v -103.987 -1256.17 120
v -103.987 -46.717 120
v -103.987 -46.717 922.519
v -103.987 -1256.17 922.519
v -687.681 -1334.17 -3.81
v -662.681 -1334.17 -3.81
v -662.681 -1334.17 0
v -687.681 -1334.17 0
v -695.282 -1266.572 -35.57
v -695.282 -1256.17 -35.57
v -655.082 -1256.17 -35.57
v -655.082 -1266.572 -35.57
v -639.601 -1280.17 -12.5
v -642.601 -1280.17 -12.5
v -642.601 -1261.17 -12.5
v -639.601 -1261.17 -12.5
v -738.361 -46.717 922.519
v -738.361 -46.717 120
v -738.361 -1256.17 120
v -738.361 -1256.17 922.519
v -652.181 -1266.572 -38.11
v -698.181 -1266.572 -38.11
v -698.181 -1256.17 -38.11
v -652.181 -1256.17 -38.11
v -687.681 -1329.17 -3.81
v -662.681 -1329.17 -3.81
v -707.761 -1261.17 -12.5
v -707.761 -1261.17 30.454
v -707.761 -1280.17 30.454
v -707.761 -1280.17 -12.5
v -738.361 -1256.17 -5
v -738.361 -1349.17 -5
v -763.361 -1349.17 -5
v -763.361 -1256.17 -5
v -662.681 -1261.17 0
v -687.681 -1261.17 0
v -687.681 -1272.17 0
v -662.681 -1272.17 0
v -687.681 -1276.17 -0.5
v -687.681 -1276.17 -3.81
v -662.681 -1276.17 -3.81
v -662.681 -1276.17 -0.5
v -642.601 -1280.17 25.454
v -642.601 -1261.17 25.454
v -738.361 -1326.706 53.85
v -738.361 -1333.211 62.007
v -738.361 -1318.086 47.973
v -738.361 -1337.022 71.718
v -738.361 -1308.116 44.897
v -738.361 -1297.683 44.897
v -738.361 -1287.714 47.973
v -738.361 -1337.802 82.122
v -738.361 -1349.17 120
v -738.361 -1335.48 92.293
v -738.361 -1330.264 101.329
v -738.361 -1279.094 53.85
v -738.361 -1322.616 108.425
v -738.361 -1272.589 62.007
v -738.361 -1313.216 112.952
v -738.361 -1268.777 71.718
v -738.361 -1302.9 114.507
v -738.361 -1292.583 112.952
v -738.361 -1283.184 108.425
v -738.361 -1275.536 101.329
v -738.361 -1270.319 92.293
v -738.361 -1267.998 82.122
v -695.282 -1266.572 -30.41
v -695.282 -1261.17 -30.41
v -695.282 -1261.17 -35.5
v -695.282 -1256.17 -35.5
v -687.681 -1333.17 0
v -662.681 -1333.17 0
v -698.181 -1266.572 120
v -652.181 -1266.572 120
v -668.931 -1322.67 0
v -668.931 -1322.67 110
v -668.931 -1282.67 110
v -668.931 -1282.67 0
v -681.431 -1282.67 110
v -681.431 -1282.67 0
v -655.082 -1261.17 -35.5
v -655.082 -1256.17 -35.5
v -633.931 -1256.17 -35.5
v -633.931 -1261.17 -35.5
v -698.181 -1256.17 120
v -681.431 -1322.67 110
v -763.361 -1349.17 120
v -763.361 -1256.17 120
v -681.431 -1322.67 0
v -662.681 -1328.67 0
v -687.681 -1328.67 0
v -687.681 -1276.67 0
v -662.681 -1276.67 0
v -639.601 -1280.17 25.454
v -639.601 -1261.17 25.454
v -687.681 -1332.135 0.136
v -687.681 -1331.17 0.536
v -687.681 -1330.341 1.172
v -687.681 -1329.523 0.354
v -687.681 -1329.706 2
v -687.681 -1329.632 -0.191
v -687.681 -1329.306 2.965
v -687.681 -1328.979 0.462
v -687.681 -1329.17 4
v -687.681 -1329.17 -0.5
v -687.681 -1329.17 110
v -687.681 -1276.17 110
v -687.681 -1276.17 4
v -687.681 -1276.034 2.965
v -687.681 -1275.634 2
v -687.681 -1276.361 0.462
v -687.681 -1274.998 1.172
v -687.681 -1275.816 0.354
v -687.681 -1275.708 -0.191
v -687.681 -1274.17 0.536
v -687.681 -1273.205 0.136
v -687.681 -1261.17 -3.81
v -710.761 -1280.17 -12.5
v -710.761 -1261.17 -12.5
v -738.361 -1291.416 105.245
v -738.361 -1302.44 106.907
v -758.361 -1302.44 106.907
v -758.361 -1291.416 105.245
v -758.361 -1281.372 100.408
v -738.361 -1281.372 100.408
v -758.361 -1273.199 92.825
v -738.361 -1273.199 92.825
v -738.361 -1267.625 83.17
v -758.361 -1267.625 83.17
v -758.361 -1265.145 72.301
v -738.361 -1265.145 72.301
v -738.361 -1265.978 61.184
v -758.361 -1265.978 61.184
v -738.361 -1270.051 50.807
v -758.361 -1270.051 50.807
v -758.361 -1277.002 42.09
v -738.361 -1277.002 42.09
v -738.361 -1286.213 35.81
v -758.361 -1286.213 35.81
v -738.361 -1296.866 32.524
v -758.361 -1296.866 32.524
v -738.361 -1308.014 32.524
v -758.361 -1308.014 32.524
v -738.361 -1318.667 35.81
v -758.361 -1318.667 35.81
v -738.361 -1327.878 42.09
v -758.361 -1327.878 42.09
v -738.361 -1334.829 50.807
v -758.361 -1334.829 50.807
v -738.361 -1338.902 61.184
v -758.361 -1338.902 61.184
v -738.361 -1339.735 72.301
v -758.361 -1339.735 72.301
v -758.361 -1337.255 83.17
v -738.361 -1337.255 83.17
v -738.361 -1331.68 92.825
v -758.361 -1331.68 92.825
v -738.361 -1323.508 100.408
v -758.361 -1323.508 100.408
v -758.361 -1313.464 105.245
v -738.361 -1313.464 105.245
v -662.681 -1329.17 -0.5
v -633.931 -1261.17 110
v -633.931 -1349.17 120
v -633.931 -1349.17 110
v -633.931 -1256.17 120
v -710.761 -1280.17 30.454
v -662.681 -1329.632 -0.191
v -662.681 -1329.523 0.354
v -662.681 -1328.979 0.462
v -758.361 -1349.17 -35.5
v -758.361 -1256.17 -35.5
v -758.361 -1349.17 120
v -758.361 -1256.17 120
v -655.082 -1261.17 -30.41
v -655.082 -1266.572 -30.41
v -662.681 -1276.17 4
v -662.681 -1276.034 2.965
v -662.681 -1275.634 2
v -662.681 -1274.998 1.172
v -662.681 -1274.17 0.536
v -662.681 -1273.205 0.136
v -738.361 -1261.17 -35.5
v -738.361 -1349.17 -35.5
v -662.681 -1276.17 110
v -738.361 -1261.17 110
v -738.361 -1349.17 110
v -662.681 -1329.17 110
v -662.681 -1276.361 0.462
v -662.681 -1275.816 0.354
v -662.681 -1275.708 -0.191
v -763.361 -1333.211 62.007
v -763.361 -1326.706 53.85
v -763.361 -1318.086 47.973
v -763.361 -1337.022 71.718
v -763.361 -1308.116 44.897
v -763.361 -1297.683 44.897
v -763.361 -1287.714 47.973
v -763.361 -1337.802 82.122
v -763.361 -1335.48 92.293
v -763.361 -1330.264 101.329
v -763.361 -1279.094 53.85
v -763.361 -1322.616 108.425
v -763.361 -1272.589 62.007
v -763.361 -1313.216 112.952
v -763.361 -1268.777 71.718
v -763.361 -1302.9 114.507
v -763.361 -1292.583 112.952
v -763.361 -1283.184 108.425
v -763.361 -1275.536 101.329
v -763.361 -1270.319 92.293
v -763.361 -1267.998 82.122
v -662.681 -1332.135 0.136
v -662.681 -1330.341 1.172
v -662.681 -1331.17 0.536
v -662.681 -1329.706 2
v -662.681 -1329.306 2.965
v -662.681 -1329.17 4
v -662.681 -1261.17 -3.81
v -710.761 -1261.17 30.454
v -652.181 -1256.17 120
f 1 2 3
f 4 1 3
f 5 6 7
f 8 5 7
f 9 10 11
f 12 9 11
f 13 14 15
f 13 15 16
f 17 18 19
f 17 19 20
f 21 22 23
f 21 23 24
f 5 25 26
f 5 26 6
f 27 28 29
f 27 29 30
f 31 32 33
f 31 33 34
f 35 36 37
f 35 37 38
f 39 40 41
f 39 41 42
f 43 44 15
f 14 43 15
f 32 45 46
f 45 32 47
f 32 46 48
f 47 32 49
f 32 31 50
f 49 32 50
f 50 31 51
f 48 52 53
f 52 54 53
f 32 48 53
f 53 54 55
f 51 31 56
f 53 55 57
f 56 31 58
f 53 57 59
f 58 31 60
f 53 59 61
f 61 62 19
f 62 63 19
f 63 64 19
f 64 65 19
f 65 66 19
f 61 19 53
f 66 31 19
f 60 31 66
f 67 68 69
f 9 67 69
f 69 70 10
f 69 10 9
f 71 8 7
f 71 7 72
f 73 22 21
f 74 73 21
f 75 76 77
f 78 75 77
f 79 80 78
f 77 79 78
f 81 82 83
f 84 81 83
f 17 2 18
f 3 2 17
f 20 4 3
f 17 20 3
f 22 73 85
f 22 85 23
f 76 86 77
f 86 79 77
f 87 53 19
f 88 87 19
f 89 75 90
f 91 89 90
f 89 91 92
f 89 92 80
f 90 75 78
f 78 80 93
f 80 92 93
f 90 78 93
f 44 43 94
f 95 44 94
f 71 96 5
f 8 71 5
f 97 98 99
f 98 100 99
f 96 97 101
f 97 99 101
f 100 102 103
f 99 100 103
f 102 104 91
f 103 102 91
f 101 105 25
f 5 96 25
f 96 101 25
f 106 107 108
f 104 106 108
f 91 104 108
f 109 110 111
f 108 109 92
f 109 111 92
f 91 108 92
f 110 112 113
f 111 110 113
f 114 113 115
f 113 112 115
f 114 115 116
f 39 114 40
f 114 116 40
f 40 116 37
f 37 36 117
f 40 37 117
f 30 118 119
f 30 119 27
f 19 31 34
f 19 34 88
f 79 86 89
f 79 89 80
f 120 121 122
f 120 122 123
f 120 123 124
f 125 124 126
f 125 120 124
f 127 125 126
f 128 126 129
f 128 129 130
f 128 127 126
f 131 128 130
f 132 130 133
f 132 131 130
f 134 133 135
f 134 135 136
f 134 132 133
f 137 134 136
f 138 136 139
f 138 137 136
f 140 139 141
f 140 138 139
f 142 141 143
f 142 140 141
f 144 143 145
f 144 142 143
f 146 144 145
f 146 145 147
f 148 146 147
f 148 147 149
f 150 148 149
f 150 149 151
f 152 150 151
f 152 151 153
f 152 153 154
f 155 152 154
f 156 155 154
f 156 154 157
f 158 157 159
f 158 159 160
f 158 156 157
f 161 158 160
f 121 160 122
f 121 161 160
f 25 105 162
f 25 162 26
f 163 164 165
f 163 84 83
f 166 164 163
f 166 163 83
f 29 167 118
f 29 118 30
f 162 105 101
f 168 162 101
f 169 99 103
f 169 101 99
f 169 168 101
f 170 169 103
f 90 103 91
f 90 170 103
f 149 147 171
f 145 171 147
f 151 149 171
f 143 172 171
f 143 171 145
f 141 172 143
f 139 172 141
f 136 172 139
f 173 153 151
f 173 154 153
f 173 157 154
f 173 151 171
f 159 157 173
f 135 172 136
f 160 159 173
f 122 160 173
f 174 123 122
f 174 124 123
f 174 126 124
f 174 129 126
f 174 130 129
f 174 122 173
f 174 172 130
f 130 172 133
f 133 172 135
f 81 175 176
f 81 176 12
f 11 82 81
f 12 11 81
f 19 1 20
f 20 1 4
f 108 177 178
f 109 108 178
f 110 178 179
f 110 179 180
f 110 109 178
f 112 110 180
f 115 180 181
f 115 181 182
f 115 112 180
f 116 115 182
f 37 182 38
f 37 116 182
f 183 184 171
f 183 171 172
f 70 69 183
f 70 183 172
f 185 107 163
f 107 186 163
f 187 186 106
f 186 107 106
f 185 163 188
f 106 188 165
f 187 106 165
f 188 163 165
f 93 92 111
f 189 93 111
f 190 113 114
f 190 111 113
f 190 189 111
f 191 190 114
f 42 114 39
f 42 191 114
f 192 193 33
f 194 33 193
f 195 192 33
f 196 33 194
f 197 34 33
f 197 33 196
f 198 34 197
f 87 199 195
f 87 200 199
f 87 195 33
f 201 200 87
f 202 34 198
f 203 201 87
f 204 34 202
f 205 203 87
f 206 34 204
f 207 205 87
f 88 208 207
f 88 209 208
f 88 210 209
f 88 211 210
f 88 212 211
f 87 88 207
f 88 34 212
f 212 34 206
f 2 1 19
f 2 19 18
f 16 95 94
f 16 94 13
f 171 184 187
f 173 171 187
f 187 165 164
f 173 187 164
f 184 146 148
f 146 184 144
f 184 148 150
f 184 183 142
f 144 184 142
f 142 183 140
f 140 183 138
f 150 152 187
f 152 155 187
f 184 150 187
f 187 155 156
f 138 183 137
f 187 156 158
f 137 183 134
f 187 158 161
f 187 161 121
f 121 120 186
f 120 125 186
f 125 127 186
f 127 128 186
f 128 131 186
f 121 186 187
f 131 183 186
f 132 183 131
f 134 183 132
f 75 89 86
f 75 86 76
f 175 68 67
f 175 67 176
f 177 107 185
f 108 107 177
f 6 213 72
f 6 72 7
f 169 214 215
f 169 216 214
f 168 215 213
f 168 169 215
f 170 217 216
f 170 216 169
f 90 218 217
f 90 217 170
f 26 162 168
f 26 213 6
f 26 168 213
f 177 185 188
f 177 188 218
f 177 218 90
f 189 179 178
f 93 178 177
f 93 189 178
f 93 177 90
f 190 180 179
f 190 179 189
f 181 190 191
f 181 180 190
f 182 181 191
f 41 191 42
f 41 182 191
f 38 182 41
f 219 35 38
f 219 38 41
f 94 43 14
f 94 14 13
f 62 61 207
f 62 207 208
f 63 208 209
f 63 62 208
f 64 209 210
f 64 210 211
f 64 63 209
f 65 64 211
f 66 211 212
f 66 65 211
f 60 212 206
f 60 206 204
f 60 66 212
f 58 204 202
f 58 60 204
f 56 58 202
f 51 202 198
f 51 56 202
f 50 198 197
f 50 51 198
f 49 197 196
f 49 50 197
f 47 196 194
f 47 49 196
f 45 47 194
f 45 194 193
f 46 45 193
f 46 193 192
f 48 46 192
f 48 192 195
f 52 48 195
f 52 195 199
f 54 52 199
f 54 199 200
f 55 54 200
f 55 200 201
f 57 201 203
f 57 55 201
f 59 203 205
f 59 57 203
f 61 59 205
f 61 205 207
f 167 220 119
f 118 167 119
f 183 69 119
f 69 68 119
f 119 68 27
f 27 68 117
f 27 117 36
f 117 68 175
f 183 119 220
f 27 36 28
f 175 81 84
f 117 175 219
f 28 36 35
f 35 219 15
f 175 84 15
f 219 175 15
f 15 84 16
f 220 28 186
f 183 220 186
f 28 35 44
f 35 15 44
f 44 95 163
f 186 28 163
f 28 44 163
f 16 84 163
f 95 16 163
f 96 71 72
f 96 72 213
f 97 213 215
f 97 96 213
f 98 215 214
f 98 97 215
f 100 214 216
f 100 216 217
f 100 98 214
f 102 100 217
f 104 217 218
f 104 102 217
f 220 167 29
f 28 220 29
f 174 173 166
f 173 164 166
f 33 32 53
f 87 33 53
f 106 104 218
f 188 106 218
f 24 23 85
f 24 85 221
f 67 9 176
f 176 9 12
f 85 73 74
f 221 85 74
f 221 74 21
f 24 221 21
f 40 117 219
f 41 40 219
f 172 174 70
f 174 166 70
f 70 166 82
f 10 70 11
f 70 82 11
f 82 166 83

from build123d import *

# Parameters (mm, degrees)
SKETCH3_W               = 25
SKETCH3_H               = 53
SKETCH3_W_2             = 12.5
SKETCH3_H_2             = 40
BOSS_EXTRUDE1_DEPTH     = 120
SKETCH4_W               = 82.5
SKETCH4_H               = 93
BOSS_EXTRUDE2_DEPTH     = 10
BOSS_EXTRUDE3_DEPTH     = 25
CUT_EXTRUDE1_DEPTH      = 1356.562056513
CUT_EXTRUDE1_DEPTH_BACK = 1356.562056513
SKETCH10_R              = 0.5
SKETCH11_W              = 25
SKETCH11_H              = 3.81
BOSS_EXTRUDE11_DEPTH    = 15
SKETCH12_W              = 3
SKETCH12_H              = 42.953894286
BOSS_EXTRUDE12_DEPTH    = 24
SKETCH12_H_2            = 37.953894286
BOSS_EXTRUDE12_2_DEPTH  = 24
SKETCH13_W              = 40.2
SKETCH13_H              = 5.16
BOSS_EXTRUDE13_DEPTH    = 10.402357812
SKETCH14_W              = 82.5
SKETCH14_H              = 155.5
BOSS_EXTRUDE14_DEPTH    = 5
SKETCH15_W              = 155.5
SKETCH15_H              = 93
SKETCH15_R              = 37.4
BOSS_EXTRUDE15_DEPTH    = 20
BOSS_EXTRUDE16_DEPTH    = 21.930019373
SKETCH6_W               = 125
SKETCH6_H               = 93
SKETCH6_R               = 35
BOSS_EXTRUDE4_DEPTH     = 25
SKETCH7_W               = 802.519036646
SKETCH7_H               = 1209.452633117
BOSS_EXTRUDE5_DEPTH     = 634.373940653
SKETCH9_W               = 46
SKETCH9_H               = 158.10999934
BOSS_EXTRUDE7_DEPTH     = 10.402357812


with BuildPart() as part:
    # Sketch3 → Boss-Extrude1 (new body)
    with BuildSketch(Plane.XY.offset(120)):
        with Locations((-675.180952072, -1302.669902776)):
            Rectangle(SKETCH3_W, SKETCH3_H)
        with Locations((-675.180952072, -1302.669902776)):
            Rectangle(SKETCH3_W_2, SKETCH3_H_2, mode=Mode.SUBTRACT)
    extrude(amount=-BOSS_EXTRUDE1_DEPTH)

    # Sketch4 → Boss-Extrude2 (add)
    with BuildSketch(Plane.XY.offset(120)):
        with Locations((-675.180952072, -1302.669902776)):
            Rectangle(SKETCH4_W, SKETCH4_H)
    extrude(amount=-BOSS_EXTRUDE2_DEPTH)

    # Sketch5 → Boss-Extrude3 (add)
    with BuildSketch(Plane.ZY.offset(687.680952072)):
        with BuildLine():
            Line((-3.81, -1276.169902776), (0, -1276.169902776))
            Line((0, -1276.169902776), (0, -1280.169902776))
            Line((0, -1280.169902776), (7.5, -1280.169902776))
            Line((7.5, -1280.169902776), (7.5, -1276.169902776))
            Line((7.5, -1276.169902776), (4, -1276.169902776))
            ThreePointArc((4, -1276.169902776), (1.171572875, -1274.998329901), (0, -1272.169902776))
            Line((0, -1272.169902776), (0, -1271.169902776))
            Line((0, -1271.169902776), (-3.81, -1271.169902776))
            Line((-3.81, -1271.169902776), (-3.81, -1276.169902776))
        make_face()
        with BuildLine():
            Line((7.5, -1329.169902776), (7.5, -1325.169902776))
            Line((7.5, -1325.169902776), (0, -1325.169902776))
            Line((0, -1325.169902776), (0, -1329.169902776))
            Line((0, -1329.169902776), (-3.81, -1329.169902776))
            Line((-3.81, -1329.169902776), (-3.81, -1334.169902776))
            Line((-3.81, -1334.169902776), (0, -1334.169902776))
            Line((0, -1334.169902776), (0, -1333.169902776))
            ThreePointArc((0, -1333.169902776), (1.171572875, -1330.341475652), (4, -1329.169902776))
            Line((4, -1329.169902776), (7.5, -1329.169902776))
        make_face()
    extrude(amount=-BOSS_EXTRUDE3_DEPTH)

    # Sketch10 → Cut-Extrude1 (cut, two sides: drawn at the far end of the back side and taken through both)
    with BuildSketch(Plane.ZY.offset(687.680952072).offset(-CUT_EXTRUDE1_DEPTH_BACK)):
        with Locations((0, -1329.169902776)):
            Circle(SKETCH10_R)
        with Locations((0, -1276.169902776)):
            Circle(SKETCH10_R)
    extrude(amount=CUT_EXTRUDE1_DEPTH + CUT_EXTRUDE1_DEPTH_BACK, mode=Mode.SUBTRACT)

    # Sketch11 → Boss-Extrude11 (add)
    with BuildSketch(Plane(origin=(0, -1256.169902776, 0), x_dir=(1, 0, 0), z_dir=(0, 1, 0))):
        with Locations((-675.180952072, 1.905)):
            Rectangle(SKETCH11_W, SKETCH11_H)
    extrude(amount=-BOSS_EXTRUDE11_DEPTH)



with BuildPart() as body_2:
    # Sketch12 → Boss-Extrude12 (new body)
    with BuildSketch(Plane(origin=(0, -1256.169902776, 0), x_dir=(1, 0, 0), z_dir=(0, 1, 0))):
        with Locations((-709.260971445, -8.976947143)):
            Rectangle(SKETCH12_W, SKETCH12_H)
    extrude(amount=-BOSS_EXTRUDE12_DEPTH)


with BuildPart() as body_3:
    # Sketch12 → Boss-Extrude12 2 (new body)
    with BuildSketch(Plane(origin=(0, -1256.169902776, 0), x_dir=(1, 0, 0), z_dir=(0, 1, 0))):
        with Locations((-641.100932699, -6.476947143)):
            Rectangle(SKETCH12_W, SKETCH12_H_2)
    extrude(amount=-BOSS_EXTRUDE12_2_DEPTH)


with BuildPart() as body_4:
    # Sketch13 → Boss-Extrude13 (new body)
    with BuildSketch(Plane(origin=(0, -1256.169902776, 0), x_dir=(1, 0, 0), z_dir=(0, 1, 0))):
        with Locations((-675.181777911, 32.98999934)):
            Rectangle(SKETCH13_W, SKETCH13_H)
    extrude(amount=-BOSS_EXTRUDE13_DEPTH)


with BuildPart() as part_1:
    add(part.part)

    add(body_2.part)  # Boss-Extrude14 merges body 2

    add(body_3.part)  # Boss-Extrude14 merges body 3

    add(body_4.part)  # Boss-Extrude14 merges body 4
    # Sketch14 → Boss-Extrude14 (add)
    with BuildSketch(Plane(origin=(0, -1256.169902776, 0), x_dir=(1, 0, 0), z_dir=(0, 1, 0))):
        with Locations((-675.180952072, -42.25)):
            Rectangle(SKETCH14_W, SKETCH14_H)
    extrude(amount=-BOSS_EXTRUDE14_DEPTH)



with BuildPart() as body_2_2:
    # Sketch15 → Boss-Extrude15 (new body)
    with BuildSketch(Plane.ZY.offset(738.360971445)):
        with Locations((42.25, -1302.669902776)):
            Rectangle(SKETCH15_W, SKETCH15_H)
        with Locations((69.506521341, -1302.439969052)):
            Circle(SKETCH15_R, mode=Mode.SUBTRACT)
    extrude(amount=BOSS_EXTRUDE15_DEPTH)


with BuildPart() as part_2:
    add(part_1.part)

    add(body_2_2.part)  # Boss-Extrude16 merges body 2 2
    # Sketch16 → Boss-Extrude16 (add)
    with BuildSketch(Plane.ZY.offset(716.430952072)):
        Polygon((110, -1349.169902776), (120, -1349.169902776), (120, -1256.169902776), (-35.5, -1256.169902776), (-35.5, -1261.169902776), (110, -1261.169902776), align=None)
    extrude(amount=BOSS_EXTRUDE16_DEPTH)


with BuildPart() as body_2_3:
    # Sketch6 → Boss-Extrude4 (new body)
    with BuildSketch(Plane.ZY.offset(738.360971445)):
        with Locations((57.5, -1302.669902776)):
            Rectangle(SKETCH6_W, SKETCH6_H)
        with Locations((79.506521341, -1302.899836501)):
            Circle(SKETCH6_R, mode=Mode.SUBTRACT)
    extrude(amount=BOSS_EXTRUDE4_DEPTH)


with BuildPart() as body_3_2:
    # Sketch7 → Boss-Extrude5 (new body)
    with BuildSketch(Plane.ZY.offset(103.987030792)):
        with Locations((521.259518323, -651.443586218)):
            Rectangle(SKETCH7_W, SKETCH7_H)
    extrude(amount=BOSS_EXTRUDE5_DEPTH)


with BuildPart() as body_4_2:
    # Sketch9 → Boss-Extrude7 (new body)
    with BuildSketch(Plane(origin=(0, -1266.572260588, 0), x_dir=(1, 0, 0), z_dir=(0, 1, 0))):
        with Locations((-675.180947929, -40.94500033)):
            Rectangle(SKETCH9_W, SKETCH9_H)
    extrude(amount=BOSS_EXTRUDE7_DEPTH)


solid = Compound([part_2.part, body_2_3.part, body_3_2.part, body_4_2.part])
